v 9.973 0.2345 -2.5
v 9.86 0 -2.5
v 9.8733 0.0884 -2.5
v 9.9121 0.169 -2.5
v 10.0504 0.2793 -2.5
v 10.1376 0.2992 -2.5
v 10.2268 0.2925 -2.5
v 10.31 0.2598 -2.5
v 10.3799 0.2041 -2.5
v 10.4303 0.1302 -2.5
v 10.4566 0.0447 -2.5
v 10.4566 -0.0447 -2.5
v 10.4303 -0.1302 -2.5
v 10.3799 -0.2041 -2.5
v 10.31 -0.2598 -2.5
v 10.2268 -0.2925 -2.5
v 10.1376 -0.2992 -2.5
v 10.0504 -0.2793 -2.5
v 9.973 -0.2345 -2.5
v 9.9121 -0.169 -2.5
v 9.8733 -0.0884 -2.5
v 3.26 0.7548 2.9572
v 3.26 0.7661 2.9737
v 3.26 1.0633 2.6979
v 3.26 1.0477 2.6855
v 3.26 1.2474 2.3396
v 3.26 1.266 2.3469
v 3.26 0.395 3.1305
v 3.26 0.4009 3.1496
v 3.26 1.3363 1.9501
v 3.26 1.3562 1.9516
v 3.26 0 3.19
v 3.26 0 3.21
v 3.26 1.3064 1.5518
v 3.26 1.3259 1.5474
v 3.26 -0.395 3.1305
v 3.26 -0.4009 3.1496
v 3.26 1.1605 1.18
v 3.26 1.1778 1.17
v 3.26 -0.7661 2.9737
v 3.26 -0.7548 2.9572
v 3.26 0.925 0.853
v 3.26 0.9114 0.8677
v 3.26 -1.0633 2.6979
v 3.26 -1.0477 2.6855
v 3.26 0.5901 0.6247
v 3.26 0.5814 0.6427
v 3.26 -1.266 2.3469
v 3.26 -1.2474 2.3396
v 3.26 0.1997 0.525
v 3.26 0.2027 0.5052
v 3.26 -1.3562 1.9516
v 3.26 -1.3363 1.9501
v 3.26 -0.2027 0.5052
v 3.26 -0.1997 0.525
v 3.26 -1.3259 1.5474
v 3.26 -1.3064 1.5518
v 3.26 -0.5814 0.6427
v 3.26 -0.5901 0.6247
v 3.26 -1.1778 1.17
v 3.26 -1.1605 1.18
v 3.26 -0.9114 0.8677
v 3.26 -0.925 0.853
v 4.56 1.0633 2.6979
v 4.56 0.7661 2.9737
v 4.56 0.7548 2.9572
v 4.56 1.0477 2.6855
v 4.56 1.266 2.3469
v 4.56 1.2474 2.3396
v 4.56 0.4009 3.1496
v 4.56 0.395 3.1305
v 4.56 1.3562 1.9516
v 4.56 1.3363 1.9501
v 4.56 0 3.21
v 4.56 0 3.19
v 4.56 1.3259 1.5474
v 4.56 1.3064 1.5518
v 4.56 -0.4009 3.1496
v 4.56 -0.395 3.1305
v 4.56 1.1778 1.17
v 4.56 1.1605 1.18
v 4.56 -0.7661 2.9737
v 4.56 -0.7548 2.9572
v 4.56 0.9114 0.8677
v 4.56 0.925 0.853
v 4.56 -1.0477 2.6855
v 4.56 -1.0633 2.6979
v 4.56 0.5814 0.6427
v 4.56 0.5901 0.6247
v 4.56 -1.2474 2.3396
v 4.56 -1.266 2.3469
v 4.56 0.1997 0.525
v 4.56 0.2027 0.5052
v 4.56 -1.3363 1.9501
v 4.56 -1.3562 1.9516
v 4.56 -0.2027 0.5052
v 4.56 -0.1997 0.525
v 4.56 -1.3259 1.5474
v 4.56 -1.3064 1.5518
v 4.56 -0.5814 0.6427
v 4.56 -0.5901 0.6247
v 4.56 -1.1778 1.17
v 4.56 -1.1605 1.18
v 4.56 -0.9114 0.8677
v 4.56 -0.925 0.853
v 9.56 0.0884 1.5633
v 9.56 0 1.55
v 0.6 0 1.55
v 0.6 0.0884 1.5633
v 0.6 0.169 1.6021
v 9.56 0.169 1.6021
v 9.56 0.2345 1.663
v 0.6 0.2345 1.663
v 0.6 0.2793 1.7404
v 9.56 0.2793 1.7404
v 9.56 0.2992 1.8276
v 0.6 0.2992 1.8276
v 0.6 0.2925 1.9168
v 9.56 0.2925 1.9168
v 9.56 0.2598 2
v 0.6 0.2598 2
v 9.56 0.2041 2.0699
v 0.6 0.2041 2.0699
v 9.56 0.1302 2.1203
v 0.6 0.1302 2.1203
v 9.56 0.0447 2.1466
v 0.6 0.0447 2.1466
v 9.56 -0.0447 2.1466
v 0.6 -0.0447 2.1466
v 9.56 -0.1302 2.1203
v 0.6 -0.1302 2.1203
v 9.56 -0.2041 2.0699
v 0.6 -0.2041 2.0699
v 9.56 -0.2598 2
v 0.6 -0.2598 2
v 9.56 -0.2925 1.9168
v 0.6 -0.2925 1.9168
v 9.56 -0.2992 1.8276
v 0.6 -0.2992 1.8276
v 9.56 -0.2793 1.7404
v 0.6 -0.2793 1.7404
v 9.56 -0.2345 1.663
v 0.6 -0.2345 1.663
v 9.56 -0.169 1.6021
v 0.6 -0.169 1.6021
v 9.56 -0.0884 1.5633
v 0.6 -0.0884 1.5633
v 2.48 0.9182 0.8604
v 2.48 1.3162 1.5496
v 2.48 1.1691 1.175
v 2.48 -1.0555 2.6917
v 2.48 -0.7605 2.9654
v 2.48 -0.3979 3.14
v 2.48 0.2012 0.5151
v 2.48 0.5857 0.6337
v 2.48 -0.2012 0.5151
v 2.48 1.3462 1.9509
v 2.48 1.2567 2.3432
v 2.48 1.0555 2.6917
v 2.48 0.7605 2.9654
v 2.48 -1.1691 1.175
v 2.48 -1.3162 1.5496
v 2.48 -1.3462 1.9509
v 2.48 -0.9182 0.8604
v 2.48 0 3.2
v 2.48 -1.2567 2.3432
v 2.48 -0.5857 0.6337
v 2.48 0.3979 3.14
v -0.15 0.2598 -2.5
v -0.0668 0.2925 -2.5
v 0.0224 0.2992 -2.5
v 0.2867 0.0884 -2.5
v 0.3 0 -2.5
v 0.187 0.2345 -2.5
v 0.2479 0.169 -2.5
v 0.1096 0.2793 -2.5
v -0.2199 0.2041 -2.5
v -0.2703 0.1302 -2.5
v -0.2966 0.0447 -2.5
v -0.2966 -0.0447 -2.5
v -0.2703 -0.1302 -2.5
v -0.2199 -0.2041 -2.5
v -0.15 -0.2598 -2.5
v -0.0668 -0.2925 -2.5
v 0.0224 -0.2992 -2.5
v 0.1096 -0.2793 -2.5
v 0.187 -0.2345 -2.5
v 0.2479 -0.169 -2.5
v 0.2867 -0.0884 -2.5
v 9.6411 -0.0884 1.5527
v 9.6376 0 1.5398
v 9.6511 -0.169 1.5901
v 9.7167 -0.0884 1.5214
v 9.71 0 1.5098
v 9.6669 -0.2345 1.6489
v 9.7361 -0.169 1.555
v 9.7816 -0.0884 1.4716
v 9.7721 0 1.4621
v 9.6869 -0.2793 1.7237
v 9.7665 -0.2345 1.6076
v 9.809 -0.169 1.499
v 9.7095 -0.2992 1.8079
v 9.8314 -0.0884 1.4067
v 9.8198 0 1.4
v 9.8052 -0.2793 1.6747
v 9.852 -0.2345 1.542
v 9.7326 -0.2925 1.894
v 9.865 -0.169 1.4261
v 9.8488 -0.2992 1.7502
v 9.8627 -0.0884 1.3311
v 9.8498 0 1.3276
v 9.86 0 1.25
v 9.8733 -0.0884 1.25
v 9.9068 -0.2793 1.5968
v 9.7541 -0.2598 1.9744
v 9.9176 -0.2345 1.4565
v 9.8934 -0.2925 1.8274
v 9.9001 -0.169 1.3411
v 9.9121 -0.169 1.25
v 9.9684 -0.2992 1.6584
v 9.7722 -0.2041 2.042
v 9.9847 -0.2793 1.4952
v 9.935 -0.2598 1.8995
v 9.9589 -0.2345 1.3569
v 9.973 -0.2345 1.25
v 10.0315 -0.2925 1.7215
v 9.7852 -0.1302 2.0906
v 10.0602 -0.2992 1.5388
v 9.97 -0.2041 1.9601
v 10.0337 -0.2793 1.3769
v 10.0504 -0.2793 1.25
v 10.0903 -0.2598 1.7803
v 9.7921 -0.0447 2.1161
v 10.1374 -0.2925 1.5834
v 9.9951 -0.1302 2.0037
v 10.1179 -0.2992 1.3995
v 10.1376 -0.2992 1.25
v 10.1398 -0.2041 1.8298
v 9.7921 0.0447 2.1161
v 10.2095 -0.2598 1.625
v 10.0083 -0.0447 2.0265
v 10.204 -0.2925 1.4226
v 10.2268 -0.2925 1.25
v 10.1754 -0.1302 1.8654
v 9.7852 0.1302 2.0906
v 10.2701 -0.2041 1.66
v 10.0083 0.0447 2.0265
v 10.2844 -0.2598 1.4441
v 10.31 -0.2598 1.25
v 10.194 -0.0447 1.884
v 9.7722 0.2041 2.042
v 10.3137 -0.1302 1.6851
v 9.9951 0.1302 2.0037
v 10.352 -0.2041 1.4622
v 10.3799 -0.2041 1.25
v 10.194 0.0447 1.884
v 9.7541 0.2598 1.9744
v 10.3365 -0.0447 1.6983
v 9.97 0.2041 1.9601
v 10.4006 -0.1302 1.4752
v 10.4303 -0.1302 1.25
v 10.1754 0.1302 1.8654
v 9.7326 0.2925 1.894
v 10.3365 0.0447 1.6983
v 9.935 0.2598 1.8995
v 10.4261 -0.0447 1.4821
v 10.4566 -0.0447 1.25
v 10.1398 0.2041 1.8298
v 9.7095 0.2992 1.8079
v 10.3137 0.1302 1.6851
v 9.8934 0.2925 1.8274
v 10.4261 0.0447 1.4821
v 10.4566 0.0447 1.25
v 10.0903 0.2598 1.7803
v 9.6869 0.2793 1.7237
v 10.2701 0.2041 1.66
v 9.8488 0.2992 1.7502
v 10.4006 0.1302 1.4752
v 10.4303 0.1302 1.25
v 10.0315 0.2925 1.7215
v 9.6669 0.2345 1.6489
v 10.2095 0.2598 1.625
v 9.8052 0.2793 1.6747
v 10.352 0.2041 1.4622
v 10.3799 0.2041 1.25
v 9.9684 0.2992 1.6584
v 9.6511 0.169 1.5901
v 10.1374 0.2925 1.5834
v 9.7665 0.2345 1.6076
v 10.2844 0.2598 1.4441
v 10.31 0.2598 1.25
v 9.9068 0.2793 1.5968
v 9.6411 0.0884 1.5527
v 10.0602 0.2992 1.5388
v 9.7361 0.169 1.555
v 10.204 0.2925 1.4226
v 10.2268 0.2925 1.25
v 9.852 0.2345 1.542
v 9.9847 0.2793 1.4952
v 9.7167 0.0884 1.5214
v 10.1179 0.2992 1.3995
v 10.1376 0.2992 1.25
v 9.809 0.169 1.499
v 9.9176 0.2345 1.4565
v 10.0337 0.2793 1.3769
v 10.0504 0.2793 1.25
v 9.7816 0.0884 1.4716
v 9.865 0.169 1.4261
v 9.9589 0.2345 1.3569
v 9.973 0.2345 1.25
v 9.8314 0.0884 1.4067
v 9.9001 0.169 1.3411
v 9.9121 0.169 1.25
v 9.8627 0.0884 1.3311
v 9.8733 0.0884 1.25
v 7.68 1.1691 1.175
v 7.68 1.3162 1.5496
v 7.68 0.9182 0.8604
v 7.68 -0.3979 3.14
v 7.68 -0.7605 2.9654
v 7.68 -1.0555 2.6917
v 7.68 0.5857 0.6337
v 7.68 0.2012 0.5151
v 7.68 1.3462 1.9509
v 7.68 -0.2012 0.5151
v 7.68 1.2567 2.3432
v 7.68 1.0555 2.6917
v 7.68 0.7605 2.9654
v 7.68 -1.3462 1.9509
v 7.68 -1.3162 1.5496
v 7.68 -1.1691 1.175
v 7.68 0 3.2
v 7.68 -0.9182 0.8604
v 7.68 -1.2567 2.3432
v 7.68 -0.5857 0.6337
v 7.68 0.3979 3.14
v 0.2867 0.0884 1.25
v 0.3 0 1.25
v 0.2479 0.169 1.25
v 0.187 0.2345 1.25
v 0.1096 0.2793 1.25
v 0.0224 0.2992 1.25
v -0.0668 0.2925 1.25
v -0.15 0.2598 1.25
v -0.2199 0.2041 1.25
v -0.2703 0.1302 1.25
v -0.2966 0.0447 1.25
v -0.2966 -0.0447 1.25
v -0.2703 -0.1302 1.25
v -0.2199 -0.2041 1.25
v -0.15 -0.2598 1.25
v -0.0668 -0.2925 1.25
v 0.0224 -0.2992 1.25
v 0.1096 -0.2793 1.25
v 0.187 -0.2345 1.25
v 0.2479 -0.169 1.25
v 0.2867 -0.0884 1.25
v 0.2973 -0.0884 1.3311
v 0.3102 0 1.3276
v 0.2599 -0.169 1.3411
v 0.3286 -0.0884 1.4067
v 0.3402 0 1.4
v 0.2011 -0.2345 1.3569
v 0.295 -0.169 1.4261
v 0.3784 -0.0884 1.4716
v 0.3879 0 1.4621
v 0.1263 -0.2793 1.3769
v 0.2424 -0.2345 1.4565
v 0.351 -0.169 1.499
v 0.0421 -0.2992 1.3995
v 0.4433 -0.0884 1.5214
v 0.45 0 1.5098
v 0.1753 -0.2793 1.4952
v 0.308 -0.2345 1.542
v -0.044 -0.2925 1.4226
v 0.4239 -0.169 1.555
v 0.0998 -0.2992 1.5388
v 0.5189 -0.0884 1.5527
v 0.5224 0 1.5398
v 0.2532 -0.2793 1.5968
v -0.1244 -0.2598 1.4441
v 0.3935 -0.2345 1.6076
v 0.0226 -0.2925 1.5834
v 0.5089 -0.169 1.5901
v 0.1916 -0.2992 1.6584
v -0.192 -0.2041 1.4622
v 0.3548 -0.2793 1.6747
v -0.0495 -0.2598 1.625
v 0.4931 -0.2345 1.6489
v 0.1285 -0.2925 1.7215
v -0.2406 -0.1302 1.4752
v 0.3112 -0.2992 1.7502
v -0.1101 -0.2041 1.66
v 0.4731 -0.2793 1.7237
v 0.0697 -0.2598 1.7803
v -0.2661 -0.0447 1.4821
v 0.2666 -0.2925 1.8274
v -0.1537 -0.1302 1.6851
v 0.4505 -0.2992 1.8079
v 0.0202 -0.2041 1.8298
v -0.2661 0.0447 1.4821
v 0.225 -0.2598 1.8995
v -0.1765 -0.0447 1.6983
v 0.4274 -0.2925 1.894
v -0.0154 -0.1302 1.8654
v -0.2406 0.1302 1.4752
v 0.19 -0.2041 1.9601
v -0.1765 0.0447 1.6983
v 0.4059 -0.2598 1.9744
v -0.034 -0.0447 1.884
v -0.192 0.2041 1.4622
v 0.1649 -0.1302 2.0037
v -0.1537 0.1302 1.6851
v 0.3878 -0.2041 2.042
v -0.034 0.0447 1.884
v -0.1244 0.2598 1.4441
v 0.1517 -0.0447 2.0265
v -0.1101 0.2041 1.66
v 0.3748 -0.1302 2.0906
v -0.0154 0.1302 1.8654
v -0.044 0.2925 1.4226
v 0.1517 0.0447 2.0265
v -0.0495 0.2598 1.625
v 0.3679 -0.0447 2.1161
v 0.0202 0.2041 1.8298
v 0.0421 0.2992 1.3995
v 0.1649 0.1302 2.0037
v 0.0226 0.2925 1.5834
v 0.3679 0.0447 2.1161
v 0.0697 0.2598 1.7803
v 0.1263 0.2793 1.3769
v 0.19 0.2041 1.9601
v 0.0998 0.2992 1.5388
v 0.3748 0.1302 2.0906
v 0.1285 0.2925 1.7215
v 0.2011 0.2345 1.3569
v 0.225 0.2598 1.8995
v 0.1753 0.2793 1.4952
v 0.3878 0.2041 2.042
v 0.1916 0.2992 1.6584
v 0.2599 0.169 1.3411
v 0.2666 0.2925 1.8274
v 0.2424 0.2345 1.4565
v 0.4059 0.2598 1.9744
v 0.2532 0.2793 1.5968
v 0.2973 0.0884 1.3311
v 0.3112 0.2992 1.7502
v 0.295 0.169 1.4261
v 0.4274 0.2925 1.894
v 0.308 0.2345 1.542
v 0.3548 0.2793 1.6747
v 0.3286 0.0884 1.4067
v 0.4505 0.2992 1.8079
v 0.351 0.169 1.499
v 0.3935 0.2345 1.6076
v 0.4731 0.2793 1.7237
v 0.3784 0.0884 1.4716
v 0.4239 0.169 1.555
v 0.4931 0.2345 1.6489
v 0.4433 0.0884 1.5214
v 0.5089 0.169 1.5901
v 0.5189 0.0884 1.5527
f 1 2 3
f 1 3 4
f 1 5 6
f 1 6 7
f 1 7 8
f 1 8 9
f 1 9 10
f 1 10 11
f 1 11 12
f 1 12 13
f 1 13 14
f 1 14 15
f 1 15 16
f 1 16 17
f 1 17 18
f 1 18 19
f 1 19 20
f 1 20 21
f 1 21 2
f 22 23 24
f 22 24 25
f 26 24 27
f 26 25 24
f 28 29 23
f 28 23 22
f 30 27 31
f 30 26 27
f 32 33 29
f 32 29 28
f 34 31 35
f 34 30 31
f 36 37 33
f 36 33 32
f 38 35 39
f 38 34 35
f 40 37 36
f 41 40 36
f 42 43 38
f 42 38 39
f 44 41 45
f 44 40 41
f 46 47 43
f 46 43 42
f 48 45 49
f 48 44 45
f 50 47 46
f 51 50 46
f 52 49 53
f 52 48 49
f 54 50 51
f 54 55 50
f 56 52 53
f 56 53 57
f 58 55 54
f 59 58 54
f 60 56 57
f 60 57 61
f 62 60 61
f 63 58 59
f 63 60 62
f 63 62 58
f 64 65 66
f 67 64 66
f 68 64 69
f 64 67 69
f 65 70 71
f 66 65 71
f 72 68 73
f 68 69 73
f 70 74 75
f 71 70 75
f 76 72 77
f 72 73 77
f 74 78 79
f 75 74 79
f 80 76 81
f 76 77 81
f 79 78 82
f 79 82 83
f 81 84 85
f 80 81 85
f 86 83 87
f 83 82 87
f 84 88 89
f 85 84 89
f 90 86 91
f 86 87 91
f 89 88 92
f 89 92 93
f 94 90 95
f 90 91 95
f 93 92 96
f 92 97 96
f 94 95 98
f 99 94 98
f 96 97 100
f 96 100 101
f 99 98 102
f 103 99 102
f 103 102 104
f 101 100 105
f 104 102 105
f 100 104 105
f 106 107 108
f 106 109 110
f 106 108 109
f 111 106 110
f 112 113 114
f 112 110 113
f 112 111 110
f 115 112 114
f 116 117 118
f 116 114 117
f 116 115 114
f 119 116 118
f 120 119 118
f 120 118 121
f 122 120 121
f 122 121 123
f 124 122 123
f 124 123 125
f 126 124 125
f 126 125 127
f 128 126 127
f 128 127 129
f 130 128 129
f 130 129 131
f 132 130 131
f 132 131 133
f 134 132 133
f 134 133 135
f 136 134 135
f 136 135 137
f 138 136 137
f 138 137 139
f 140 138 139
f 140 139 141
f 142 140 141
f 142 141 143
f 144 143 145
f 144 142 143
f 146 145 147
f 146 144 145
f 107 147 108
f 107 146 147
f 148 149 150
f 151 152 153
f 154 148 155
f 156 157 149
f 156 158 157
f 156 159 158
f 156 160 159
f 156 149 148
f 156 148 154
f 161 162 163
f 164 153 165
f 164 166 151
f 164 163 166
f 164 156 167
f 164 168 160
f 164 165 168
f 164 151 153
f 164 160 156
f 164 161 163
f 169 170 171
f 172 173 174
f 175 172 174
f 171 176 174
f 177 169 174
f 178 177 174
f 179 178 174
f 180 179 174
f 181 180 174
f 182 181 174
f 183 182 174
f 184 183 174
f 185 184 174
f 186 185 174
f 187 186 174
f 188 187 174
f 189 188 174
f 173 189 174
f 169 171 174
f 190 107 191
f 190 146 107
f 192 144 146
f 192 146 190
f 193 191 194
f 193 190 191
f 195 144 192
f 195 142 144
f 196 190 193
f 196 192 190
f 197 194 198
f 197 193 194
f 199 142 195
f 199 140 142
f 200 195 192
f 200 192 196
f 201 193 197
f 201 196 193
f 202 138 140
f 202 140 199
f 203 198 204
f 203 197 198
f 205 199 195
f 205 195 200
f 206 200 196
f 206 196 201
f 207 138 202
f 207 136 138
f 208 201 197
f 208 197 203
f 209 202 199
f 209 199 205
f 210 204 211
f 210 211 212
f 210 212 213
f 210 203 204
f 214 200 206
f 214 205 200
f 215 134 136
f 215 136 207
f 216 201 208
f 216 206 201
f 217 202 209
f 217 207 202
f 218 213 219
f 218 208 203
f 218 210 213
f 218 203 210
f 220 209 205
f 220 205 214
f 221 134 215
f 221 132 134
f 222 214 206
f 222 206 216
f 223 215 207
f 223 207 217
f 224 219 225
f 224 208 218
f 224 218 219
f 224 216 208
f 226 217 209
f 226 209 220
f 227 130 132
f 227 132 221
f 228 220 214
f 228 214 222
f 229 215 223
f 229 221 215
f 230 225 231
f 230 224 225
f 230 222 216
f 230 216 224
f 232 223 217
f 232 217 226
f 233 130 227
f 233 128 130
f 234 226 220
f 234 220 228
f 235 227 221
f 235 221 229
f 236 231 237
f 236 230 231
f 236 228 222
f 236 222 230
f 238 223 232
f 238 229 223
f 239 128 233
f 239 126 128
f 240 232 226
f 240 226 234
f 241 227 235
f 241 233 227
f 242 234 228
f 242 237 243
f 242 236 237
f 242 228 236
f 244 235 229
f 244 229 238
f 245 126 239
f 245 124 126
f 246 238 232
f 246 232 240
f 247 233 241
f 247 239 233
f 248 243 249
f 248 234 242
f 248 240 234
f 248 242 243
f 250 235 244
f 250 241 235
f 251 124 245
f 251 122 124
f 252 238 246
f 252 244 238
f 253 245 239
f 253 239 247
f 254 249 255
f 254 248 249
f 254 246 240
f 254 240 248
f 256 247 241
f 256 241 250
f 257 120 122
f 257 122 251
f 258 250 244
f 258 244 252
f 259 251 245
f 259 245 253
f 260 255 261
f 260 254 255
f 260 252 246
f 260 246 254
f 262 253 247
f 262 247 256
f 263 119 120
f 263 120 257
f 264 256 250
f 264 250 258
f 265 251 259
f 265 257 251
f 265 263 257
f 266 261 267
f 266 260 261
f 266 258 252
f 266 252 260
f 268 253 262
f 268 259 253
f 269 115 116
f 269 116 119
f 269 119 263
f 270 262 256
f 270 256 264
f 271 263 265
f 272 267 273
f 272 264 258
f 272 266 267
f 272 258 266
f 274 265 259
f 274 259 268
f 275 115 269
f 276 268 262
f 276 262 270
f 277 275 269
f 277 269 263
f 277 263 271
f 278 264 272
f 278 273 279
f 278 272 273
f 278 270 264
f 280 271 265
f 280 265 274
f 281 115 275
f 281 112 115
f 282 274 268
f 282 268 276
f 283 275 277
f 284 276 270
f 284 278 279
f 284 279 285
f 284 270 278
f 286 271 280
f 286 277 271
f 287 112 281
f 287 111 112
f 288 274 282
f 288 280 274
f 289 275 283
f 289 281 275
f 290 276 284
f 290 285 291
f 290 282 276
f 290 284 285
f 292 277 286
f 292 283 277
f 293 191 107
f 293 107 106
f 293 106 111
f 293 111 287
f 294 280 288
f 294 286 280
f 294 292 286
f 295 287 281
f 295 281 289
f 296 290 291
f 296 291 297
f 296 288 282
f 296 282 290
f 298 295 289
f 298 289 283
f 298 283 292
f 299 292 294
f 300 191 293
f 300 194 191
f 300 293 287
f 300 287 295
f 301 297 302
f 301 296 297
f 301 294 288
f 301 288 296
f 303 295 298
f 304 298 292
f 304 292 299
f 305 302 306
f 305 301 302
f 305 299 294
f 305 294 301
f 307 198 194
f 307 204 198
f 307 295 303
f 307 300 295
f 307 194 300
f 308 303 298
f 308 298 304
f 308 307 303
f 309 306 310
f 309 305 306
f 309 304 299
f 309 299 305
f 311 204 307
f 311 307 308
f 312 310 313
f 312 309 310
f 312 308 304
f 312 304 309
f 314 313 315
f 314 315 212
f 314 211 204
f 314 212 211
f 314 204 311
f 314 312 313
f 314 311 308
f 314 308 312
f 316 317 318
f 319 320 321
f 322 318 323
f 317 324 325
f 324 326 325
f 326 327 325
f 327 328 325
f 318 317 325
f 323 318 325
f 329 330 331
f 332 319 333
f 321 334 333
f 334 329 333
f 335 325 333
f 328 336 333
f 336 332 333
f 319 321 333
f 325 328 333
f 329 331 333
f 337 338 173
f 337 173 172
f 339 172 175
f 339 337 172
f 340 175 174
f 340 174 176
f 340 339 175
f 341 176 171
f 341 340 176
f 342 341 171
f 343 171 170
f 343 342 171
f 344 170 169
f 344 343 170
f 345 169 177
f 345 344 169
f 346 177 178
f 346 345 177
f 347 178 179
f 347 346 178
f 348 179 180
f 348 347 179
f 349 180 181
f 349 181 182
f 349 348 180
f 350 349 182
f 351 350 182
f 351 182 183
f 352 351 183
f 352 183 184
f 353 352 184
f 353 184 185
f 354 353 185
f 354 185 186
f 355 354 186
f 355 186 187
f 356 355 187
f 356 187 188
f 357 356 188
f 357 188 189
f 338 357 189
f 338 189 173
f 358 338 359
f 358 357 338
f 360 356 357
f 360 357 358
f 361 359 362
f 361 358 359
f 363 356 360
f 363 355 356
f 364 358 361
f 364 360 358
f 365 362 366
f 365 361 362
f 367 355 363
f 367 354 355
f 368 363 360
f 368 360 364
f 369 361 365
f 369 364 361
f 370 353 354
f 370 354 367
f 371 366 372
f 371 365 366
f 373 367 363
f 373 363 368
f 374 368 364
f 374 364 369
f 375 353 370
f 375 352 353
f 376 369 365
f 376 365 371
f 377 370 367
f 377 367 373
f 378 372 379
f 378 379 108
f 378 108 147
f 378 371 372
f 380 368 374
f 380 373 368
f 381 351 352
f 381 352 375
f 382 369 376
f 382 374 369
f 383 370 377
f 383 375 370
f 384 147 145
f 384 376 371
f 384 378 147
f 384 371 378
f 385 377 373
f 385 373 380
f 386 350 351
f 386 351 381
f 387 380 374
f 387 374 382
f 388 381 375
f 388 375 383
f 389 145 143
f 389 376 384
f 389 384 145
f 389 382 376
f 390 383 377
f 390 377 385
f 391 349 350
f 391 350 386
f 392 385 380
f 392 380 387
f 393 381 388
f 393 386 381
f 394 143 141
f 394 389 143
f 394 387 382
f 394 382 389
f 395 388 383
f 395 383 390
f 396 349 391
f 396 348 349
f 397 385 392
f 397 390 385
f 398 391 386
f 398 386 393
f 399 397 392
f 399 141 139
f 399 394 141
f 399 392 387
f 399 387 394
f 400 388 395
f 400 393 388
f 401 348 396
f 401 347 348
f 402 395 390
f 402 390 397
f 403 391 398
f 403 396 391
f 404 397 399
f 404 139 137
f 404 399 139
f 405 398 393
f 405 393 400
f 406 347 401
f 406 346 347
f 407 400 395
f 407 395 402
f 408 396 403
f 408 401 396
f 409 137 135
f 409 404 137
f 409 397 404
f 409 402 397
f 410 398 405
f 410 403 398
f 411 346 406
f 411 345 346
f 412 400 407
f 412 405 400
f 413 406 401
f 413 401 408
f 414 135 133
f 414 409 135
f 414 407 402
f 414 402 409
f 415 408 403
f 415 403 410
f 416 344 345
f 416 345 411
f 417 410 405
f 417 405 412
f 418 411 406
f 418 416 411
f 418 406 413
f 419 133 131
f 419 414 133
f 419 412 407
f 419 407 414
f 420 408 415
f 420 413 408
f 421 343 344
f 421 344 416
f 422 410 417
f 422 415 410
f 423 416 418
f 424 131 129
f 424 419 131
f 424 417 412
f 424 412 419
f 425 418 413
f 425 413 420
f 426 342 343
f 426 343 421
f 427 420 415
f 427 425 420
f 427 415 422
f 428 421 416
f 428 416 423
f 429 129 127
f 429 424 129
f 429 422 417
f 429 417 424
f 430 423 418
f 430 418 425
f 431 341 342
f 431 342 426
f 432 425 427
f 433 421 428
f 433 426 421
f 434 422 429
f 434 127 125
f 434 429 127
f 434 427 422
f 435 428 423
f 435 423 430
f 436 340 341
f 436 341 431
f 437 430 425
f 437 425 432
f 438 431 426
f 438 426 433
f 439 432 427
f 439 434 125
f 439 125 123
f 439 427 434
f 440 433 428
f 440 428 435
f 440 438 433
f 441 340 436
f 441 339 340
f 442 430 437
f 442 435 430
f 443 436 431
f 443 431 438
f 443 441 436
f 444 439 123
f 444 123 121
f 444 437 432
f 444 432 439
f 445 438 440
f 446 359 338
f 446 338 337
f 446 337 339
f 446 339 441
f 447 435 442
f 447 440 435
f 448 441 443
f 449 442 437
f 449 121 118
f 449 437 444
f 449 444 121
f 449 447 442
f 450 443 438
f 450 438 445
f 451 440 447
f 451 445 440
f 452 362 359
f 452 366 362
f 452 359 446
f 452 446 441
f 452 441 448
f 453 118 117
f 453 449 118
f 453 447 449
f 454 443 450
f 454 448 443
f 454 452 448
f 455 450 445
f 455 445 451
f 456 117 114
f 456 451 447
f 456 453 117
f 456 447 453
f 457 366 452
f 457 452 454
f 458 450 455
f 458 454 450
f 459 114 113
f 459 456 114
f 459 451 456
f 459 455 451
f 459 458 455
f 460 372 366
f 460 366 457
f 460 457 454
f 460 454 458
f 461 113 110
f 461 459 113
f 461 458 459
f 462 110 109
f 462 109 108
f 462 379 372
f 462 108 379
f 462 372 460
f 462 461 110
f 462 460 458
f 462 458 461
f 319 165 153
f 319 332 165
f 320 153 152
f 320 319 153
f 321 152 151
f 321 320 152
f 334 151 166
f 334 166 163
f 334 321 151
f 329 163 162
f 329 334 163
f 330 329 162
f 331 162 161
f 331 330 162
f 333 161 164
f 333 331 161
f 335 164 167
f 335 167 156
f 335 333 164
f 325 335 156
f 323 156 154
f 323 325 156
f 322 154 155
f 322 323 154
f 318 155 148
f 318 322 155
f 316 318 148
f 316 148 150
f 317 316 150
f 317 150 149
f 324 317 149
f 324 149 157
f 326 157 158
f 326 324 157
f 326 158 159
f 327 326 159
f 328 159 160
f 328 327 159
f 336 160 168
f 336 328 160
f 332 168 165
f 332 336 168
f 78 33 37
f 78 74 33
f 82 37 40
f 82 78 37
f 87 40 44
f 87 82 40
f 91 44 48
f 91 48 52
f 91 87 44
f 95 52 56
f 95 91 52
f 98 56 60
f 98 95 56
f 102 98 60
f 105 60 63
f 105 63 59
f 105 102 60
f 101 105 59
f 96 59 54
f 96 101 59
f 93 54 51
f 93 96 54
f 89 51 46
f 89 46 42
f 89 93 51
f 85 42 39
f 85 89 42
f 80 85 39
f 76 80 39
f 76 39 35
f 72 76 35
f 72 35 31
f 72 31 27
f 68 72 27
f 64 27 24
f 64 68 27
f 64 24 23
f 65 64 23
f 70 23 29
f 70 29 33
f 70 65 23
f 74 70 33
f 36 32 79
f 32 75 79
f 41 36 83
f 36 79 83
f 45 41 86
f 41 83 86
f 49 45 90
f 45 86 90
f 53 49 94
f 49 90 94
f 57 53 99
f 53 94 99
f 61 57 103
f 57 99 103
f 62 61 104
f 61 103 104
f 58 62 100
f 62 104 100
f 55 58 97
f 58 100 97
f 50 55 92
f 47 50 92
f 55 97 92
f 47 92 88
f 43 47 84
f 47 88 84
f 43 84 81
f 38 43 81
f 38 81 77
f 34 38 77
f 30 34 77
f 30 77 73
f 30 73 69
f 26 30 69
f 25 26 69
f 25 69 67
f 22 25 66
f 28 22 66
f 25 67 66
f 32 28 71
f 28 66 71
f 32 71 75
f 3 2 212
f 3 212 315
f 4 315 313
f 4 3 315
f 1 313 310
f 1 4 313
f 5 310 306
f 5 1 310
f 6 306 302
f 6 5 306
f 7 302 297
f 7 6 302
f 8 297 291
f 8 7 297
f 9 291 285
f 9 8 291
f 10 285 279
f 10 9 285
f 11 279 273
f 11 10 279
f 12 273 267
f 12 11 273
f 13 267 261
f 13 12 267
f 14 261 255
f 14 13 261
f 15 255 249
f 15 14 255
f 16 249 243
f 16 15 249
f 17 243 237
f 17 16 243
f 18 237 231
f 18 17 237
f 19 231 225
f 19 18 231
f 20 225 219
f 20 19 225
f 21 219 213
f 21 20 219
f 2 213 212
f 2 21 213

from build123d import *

# Parameters (mm, degrees)
SKETCH002_W = 5.2
SKETCH002_H = 1.35
SKETCH003_W = 1.3
SKETCH003_H = 0.02
SKETCH_R    = 0.3


with BuildPart() as revolution:
    # Sketch002 → Revolution (revolve)
    with BuildSketch(Plane.XZ):
        with Locations((5.08, 2.525)):
            Rectangle(SKETCH002_W, SKETCH002_H)
    revolve(axis=Axis((2.48, 0, 1.85), (1, 0, 0)))


with BuildPart() as revolution001:
    # Sketch003 → Revolution001 (revolve)
    with BuildSketch(Plane.XZ):
        with Locations((3.91, 3.2)):
            Rectangle(SKETCH003_W, SKETCH003_H)
    revolve(axis=Axis((0, 0, 1.85), (1, 0, 0)))


with BuildPart() as sweep_body:
    # Sweep: sweep along a path in Sketch001
    with BuildLine(Plane.XZ) as sweep_path:
        Line((0, -2.5), (0, 1.25))
        ThreePointArc((0, 1.25), (0.175736, 1.674264), (0.6, 1.85))
        Line((0.6, 1.85), (9.56, 1.85))
        ThreePointArc((9.56, 1.85), (9.984264, 1.674264), (10.16, 1.25))
        Line((10.16, 1.25), (10.16, -2.5))
    # Sketch → Sweep (sweep)
    with BuildSketch(Plane.XY.offset(-2)):
        Circle(SKETCH_R)
    sweep(path=sweep_path.line)


solid = Compound([revolution.part, revolution001.part, sweep_body.part])
